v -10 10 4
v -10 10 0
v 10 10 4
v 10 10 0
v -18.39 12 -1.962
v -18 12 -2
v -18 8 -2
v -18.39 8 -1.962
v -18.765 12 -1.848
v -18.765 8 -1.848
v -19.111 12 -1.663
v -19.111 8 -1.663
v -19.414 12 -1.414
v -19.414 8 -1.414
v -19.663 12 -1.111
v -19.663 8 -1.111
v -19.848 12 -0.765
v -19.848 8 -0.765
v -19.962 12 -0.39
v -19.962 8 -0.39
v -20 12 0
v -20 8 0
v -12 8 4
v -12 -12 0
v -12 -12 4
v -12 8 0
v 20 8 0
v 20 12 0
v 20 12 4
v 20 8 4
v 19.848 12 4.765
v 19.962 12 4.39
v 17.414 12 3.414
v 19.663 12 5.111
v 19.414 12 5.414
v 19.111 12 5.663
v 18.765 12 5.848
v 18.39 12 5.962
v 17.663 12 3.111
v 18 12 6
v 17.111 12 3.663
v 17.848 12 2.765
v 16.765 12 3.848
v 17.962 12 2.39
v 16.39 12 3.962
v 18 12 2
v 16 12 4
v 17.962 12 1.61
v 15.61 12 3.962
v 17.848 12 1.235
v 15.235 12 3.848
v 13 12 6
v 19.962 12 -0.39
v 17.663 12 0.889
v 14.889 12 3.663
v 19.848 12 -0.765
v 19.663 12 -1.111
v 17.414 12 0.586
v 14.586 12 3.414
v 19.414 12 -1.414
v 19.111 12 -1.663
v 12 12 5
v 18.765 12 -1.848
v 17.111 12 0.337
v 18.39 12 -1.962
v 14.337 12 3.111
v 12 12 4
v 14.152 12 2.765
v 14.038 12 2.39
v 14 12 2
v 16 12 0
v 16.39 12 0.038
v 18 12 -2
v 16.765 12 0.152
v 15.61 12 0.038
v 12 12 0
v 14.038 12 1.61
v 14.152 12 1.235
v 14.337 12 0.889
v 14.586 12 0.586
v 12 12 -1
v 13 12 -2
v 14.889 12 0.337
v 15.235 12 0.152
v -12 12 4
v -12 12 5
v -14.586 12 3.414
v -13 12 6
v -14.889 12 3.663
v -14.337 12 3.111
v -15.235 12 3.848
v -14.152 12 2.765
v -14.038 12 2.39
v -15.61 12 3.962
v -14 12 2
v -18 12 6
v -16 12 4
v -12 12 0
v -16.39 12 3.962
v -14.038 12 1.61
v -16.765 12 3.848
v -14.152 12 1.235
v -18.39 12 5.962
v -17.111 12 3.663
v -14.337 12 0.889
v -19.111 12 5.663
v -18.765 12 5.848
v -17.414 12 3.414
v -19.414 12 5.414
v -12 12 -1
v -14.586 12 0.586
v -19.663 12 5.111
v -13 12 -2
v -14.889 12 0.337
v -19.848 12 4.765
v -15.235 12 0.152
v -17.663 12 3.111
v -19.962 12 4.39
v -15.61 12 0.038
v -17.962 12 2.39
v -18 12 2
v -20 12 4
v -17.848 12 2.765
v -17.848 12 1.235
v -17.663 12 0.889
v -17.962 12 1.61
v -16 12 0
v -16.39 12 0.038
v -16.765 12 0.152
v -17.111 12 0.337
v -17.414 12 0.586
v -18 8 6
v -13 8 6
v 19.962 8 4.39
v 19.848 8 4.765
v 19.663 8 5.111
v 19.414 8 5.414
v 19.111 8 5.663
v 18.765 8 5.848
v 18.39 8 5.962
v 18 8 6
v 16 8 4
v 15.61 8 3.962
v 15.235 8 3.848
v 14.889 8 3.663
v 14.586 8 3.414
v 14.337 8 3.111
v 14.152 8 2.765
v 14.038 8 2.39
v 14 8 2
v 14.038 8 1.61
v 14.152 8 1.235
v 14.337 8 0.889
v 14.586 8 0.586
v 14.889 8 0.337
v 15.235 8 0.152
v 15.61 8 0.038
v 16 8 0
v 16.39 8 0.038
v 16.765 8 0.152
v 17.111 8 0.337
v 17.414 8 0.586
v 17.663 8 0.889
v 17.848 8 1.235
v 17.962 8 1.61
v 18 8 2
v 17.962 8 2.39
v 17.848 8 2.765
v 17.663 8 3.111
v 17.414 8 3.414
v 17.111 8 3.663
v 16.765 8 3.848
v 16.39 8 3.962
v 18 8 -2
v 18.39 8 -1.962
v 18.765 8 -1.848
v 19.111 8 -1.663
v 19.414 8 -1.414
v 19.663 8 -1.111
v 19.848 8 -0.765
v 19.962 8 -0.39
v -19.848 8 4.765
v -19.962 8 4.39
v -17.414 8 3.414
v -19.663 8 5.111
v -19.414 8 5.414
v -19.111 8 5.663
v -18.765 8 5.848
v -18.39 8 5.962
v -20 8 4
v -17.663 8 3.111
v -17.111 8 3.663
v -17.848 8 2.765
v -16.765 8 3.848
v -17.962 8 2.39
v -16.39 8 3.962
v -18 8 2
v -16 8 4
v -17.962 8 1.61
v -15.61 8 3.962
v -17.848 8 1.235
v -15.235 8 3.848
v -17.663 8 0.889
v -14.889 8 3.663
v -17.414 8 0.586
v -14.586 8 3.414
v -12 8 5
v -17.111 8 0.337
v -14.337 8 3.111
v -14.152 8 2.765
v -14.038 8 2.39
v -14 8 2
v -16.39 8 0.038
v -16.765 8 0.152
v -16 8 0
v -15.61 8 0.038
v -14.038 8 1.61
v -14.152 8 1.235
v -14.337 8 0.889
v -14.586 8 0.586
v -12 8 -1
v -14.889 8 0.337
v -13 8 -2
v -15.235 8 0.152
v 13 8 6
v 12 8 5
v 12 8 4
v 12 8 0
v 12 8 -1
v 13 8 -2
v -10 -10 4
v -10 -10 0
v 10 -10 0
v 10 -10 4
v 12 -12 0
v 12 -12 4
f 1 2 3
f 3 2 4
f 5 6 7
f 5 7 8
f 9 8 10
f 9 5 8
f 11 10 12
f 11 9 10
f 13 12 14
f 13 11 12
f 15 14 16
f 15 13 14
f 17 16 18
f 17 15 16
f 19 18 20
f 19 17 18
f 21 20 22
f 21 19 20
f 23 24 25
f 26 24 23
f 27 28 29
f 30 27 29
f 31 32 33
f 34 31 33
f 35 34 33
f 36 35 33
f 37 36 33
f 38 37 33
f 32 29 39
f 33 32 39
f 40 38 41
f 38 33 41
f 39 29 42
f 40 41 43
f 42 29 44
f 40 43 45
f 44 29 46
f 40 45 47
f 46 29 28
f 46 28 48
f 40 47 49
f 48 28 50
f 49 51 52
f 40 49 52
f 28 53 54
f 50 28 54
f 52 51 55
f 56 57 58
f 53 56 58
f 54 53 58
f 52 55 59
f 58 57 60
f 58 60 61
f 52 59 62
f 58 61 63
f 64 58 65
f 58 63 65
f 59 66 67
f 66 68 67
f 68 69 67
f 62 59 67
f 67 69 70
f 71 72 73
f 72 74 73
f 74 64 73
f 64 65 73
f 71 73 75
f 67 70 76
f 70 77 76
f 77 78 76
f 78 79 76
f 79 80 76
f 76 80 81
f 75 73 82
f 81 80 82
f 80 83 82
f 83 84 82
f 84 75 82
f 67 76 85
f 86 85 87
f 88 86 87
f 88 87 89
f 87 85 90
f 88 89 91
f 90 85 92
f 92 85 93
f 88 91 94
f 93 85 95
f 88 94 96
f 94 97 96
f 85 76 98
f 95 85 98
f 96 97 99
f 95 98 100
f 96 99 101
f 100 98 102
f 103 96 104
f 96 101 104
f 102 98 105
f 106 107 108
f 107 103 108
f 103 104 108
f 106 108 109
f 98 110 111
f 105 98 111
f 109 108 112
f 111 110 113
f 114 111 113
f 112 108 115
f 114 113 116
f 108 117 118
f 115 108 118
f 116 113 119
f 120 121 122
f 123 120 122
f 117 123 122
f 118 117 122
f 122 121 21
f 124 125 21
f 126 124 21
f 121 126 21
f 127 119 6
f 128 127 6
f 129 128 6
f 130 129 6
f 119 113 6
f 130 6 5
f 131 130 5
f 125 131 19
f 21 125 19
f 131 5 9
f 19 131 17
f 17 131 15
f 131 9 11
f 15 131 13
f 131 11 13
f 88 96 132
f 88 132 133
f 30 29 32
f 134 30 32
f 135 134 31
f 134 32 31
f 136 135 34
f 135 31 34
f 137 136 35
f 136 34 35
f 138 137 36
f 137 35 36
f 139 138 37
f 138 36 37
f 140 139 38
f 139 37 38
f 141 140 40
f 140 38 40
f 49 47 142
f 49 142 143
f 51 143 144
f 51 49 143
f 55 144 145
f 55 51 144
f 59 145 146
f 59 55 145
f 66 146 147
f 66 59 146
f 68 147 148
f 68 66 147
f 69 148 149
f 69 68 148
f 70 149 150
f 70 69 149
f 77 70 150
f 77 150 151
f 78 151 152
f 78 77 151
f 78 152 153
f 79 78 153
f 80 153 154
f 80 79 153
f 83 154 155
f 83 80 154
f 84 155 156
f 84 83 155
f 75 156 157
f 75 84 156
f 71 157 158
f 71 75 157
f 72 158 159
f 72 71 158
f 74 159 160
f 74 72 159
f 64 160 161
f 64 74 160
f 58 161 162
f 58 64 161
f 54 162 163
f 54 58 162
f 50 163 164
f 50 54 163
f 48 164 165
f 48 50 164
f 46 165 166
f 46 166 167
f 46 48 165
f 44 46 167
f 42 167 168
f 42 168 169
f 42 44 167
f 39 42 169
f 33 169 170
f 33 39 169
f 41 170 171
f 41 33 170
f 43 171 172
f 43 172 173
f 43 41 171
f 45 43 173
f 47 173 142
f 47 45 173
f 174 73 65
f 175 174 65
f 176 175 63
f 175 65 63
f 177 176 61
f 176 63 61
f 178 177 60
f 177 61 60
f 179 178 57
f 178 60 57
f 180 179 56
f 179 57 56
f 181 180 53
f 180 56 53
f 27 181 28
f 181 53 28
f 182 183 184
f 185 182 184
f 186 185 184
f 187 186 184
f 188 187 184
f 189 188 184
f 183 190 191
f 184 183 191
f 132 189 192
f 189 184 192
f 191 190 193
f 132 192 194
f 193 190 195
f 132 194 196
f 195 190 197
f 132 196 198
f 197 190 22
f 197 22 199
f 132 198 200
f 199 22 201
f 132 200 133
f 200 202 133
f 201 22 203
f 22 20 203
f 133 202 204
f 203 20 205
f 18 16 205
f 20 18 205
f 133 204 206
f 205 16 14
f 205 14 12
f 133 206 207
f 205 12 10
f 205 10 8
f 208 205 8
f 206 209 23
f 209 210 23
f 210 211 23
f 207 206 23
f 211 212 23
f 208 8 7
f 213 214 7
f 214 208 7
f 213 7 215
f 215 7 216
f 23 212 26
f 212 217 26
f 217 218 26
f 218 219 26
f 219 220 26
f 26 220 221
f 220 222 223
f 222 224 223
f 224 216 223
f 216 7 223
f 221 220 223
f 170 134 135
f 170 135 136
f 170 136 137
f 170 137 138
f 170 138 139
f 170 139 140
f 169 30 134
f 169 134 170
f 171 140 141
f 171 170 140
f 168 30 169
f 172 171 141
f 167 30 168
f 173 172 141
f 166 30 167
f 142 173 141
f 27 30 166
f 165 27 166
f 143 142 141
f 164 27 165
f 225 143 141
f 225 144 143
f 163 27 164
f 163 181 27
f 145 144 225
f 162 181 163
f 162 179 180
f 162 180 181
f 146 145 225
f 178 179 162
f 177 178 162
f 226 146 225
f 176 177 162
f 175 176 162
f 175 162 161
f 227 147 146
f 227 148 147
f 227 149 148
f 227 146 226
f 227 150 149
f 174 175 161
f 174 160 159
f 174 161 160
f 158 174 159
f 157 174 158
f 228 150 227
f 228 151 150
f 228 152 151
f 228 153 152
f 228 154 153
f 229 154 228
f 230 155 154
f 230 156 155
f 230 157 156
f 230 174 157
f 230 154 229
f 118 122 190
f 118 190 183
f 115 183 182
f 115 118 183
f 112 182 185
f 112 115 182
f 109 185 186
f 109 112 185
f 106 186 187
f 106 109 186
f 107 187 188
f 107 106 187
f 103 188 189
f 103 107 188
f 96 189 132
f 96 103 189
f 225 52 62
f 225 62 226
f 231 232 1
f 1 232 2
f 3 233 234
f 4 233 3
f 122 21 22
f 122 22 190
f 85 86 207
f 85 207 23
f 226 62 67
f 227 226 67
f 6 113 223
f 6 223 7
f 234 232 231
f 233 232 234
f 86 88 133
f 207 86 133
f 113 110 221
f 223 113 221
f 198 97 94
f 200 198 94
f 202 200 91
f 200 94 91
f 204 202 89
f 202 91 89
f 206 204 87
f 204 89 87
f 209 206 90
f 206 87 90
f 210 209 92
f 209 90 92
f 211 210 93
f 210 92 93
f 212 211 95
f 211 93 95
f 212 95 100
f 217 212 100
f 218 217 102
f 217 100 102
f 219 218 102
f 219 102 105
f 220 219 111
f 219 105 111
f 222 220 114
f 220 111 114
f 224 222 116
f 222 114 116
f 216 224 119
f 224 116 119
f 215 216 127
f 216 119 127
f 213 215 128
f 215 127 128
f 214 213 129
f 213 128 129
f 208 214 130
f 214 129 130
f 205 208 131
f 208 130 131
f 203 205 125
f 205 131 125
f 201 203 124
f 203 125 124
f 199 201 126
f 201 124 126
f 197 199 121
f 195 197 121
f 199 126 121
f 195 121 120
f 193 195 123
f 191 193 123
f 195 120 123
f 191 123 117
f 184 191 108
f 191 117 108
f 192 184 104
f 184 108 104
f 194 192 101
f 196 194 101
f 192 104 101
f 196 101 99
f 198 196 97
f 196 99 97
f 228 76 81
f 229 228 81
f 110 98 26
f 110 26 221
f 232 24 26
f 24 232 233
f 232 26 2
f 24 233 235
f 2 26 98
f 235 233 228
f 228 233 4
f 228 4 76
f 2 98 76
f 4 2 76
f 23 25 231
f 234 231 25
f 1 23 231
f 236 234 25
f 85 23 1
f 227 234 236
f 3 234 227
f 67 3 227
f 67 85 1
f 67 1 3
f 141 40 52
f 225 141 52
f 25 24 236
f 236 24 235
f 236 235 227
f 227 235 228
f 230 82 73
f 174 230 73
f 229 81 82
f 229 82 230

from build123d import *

# Parameters (mm, degrees)
SKETCH_1_W                 = 24
SKETCH_1_H                 = 24
SKETCH_1_W_2               = 20
SKETCH_1_H_2               = 20
EXTRUDE_1_DEPTH            = 4
SKETCH_6_R                 = 2
EXTRUDE_2_DEPTH            = 4
CHAMFER_1_SIZE             = 1
CHAMFER_1_OF_MIRROR_1_SIZE = 1


with BuildPart() as part:
    # Эскиз1 → Бобышка-Вытянуть1 (new body)
    with BuildSketch(Plane.XY):
        Rectangle(SKETCH_1_W, SKETCH_1_H)
        Rectangle(SKETCH_1_W_2, SKETCH_1_H_2, mode=Mode.SUBTRACT)
    extrude(amount=EXTRUDE_1_DEPTH)

    # Эскиз6 → Бобышка-Вытянуть2 (add)
    with BuildSketch(Plane(origin=(0, 12, 0), x_dir=(1, 0, 0), z_dir=(0, 1, 0))):
        with BuildLine():
            Line((-12, 2), (-18, 2))
            ThreePointArc((-18, 2), (-19.414213562, 1.414213562), (-20, 0))
            Line((-20, 0), (-20, -4))
            ThreePointArc((-20, -4), (-19.414213562, -5.414213562), (-18, -6))
            Line((-18, -6), (-12, -6))
            Line((-12, -6), (-12, 2))
        make_face()
        with Locations(Location((-16, -2, 0), (0, 0, 270))):
            Circle(SKETCH_6_R, mode=Mode.SUBTRACT)
    extrude_2 = extrude(amount=-EXTRUDE_2_DEPTH)

    # Фаска1
    chamfer_1_edges = [part.edges().sort_by_distance(p)[0] for p in [
        (-12, 10, -2),
        (-12, 10, 6),
    ]]
    chamfer(chamfer_1_edges, length=CHAMFER_1_SIZE)

    # Зеркальное отражение1: Бобышка-Вытянуть2 across plane
    add(extrude_2.mirror(Plane(origin=(0, 0, 0), x_dir=(0, 0, 1), z_dir=(1, 0, 0))))

    # Фаска1 of Зеркальное отражение1
    chamfer_1_of_mirror_1_edges = [part.edges().sort_by_distance(p)[0] for p in [
        (12, 10, -2),
        (12, 10, 6),
    ]]
    chamfer(chamfer_1_of_mirror_1_edges, length=CHAMFER_1_OF_MIRROR_1_SIZE)


solid = part.part
